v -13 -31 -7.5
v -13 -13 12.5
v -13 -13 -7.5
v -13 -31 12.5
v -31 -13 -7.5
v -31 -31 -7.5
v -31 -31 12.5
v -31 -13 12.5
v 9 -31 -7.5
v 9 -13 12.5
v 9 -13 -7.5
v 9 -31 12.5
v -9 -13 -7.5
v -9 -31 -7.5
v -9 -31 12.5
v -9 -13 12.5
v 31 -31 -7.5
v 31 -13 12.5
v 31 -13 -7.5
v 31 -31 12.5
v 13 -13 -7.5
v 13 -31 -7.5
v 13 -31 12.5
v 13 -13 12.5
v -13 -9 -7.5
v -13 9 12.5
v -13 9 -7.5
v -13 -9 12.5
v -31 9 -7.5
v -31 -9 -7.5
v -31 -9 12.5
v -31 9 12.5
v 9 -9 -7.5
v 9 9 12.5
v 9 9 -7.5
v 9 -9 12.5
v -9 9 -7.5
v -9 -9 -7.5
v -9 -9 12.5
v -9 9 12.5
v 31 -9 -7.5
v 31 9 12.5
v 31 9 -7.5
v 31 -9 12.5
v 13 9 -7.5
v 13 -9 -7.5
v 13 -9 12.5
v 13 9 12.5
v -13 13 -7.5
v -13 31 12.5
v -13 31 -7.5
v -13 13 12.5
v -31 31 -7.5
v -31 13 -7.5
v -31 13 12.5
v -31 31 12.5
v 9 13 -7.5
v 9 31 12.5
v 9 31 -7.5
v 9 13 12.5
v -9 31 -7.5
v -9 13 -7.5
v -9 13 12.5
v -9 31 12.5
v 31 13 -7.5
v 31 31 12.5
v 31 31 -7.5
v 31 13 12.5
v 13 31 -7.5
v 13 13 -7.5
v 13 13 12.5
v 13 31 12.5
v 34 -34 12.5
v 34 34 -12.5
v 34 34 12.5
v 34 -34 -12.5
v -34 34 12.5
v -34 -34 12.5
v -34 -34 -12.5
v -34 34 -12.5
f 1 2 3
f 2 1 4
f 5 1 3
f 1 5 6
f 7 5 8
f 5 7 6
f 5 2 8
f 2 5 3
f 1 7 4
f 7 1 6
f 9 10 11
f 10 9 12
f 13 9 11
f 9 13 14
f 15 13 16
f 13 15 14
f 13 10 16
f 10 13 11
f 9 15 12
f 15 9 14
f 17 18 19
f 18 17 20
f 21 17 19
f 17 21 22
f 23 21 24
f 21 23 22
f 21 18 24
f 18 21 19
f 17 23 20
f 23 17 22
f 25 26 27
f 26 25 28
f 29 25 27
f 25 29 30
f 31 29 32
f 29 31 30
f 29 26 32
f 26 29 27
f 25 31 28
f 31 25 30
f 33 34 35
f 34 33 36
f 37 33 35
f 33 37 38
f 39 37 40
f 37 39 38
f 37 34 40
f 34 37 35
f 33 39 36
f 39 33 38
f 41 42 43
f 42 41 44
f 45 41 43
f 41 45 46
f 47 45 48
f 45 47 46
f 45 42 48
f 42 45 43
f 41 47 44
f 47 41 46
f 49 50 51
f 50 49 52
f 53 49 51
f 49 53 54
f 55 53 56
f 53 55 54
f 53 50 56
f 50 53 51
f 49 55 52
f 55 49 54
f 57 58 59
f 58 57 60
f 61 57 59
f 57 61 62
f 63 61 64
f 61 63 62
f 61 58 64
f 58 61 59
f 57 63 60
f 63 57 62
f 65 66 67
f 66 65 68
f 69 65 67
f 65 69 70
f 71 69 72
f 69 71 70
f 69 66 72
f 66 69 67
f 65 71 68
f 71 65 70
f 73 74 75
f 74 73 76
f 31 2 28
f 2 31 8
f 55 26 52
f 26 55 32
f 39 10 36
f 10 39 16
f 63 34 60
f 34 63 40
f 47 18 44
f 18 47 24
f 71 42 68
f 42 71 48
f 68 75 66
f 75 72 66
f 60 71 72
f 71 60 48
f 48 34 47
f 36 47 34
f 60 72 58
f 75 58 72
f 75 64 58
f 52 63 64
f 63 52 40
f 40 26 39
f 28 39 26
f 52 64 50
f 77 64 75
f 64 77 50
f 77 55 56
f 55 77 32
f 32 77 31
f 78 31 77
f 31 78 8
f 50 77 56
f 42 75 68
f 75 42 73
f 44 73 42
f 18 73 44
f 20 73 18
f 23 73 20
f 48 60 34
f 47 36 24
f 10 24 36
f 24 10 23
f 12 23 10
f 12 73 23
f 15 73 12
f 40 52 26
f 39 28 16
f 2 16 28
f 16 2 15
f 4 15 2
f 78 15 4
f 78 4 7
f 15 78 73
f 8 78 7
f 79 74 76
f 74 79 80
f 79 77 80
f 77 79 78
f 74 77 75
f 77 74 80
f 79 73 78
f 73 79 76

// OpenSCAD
$fn = 32;

// ----------------------------------------------------------------------
// Pocket plate 68 x 68 x 25
// 3 x 3 pockets 18 mm square, 20 mm deep
// ----------------------------------------------------------------------

// --- parameters (mm) ---
thickness = 25;  // plate thickness
floor_t = 5;     // material left under each pocket
pocket = 18;     // pocket side length
pitch_x = 22;    // pocket pitch along X
pitch_y = 22;    // pocket pitch along Y
cols = 3;        // pockets per row
rows = 3;        // rows of pockets

// --- derived feature positions (mm) ---
depth = thickness - floor_t;        // = 20   pocket depth, down to the floor
span_x = (cols - 1) * pitch_x;      // = 44   distance between outer pockets
span_y = (rows - 1) * pitch_y;      // = 44   distance between outer pocket rows
origin_x = -span_x / 2;             // = -22   X of the first pocket
origin_y = -span_y / 2;             // = -22   Y of the first pocket
plate = [span_x + pocket + 6, span_y + pocket + 6, thickness];  // = [68, 68, 25]   overall size: pockets plus 3 mm of wall on each side
feature_centers = [
  [origin_x + 0 * pitch_x, origin_y + 0 * pitch_y],
  [origin_x + 1 * pitch_x, origin_y + 0 * pitch_y],
  [origin_x + 2 * pitch_x, origin_y + 0 * pitch_y],
  [origin_x + 0 * pitch_x, origin_y + 1 * pitch_y],
  [origin_x + 1 * pitch_x, origin_y + 1 * pitch_y],
  [origin_x + 2 * pitch_x, origin_y + 1 * pitch_y],
  [origin_x + 0 * pitch_x, origin_y + 2 * pitch_y],
  [origin_x + 1 * pitch_x, origin_y + 2 * pitch_y],
  [origin_x + 2 * pitch_x, origin_y + 2 * pitch_y]
];   // pocket centres, used verbatim by the cutter loop

// plate outline, then one pocket per centre in feature_centers
difference() {
  cube(plate, center = true);
  for (centre = feature_centers)
    translate([centre[0] - pocket / 2, centre[1] - pocket / 2, plate[2] / 2 - depth])
      cube([pocket, pocket, depth + 1]);  // centred on the declared pocket centre
}
